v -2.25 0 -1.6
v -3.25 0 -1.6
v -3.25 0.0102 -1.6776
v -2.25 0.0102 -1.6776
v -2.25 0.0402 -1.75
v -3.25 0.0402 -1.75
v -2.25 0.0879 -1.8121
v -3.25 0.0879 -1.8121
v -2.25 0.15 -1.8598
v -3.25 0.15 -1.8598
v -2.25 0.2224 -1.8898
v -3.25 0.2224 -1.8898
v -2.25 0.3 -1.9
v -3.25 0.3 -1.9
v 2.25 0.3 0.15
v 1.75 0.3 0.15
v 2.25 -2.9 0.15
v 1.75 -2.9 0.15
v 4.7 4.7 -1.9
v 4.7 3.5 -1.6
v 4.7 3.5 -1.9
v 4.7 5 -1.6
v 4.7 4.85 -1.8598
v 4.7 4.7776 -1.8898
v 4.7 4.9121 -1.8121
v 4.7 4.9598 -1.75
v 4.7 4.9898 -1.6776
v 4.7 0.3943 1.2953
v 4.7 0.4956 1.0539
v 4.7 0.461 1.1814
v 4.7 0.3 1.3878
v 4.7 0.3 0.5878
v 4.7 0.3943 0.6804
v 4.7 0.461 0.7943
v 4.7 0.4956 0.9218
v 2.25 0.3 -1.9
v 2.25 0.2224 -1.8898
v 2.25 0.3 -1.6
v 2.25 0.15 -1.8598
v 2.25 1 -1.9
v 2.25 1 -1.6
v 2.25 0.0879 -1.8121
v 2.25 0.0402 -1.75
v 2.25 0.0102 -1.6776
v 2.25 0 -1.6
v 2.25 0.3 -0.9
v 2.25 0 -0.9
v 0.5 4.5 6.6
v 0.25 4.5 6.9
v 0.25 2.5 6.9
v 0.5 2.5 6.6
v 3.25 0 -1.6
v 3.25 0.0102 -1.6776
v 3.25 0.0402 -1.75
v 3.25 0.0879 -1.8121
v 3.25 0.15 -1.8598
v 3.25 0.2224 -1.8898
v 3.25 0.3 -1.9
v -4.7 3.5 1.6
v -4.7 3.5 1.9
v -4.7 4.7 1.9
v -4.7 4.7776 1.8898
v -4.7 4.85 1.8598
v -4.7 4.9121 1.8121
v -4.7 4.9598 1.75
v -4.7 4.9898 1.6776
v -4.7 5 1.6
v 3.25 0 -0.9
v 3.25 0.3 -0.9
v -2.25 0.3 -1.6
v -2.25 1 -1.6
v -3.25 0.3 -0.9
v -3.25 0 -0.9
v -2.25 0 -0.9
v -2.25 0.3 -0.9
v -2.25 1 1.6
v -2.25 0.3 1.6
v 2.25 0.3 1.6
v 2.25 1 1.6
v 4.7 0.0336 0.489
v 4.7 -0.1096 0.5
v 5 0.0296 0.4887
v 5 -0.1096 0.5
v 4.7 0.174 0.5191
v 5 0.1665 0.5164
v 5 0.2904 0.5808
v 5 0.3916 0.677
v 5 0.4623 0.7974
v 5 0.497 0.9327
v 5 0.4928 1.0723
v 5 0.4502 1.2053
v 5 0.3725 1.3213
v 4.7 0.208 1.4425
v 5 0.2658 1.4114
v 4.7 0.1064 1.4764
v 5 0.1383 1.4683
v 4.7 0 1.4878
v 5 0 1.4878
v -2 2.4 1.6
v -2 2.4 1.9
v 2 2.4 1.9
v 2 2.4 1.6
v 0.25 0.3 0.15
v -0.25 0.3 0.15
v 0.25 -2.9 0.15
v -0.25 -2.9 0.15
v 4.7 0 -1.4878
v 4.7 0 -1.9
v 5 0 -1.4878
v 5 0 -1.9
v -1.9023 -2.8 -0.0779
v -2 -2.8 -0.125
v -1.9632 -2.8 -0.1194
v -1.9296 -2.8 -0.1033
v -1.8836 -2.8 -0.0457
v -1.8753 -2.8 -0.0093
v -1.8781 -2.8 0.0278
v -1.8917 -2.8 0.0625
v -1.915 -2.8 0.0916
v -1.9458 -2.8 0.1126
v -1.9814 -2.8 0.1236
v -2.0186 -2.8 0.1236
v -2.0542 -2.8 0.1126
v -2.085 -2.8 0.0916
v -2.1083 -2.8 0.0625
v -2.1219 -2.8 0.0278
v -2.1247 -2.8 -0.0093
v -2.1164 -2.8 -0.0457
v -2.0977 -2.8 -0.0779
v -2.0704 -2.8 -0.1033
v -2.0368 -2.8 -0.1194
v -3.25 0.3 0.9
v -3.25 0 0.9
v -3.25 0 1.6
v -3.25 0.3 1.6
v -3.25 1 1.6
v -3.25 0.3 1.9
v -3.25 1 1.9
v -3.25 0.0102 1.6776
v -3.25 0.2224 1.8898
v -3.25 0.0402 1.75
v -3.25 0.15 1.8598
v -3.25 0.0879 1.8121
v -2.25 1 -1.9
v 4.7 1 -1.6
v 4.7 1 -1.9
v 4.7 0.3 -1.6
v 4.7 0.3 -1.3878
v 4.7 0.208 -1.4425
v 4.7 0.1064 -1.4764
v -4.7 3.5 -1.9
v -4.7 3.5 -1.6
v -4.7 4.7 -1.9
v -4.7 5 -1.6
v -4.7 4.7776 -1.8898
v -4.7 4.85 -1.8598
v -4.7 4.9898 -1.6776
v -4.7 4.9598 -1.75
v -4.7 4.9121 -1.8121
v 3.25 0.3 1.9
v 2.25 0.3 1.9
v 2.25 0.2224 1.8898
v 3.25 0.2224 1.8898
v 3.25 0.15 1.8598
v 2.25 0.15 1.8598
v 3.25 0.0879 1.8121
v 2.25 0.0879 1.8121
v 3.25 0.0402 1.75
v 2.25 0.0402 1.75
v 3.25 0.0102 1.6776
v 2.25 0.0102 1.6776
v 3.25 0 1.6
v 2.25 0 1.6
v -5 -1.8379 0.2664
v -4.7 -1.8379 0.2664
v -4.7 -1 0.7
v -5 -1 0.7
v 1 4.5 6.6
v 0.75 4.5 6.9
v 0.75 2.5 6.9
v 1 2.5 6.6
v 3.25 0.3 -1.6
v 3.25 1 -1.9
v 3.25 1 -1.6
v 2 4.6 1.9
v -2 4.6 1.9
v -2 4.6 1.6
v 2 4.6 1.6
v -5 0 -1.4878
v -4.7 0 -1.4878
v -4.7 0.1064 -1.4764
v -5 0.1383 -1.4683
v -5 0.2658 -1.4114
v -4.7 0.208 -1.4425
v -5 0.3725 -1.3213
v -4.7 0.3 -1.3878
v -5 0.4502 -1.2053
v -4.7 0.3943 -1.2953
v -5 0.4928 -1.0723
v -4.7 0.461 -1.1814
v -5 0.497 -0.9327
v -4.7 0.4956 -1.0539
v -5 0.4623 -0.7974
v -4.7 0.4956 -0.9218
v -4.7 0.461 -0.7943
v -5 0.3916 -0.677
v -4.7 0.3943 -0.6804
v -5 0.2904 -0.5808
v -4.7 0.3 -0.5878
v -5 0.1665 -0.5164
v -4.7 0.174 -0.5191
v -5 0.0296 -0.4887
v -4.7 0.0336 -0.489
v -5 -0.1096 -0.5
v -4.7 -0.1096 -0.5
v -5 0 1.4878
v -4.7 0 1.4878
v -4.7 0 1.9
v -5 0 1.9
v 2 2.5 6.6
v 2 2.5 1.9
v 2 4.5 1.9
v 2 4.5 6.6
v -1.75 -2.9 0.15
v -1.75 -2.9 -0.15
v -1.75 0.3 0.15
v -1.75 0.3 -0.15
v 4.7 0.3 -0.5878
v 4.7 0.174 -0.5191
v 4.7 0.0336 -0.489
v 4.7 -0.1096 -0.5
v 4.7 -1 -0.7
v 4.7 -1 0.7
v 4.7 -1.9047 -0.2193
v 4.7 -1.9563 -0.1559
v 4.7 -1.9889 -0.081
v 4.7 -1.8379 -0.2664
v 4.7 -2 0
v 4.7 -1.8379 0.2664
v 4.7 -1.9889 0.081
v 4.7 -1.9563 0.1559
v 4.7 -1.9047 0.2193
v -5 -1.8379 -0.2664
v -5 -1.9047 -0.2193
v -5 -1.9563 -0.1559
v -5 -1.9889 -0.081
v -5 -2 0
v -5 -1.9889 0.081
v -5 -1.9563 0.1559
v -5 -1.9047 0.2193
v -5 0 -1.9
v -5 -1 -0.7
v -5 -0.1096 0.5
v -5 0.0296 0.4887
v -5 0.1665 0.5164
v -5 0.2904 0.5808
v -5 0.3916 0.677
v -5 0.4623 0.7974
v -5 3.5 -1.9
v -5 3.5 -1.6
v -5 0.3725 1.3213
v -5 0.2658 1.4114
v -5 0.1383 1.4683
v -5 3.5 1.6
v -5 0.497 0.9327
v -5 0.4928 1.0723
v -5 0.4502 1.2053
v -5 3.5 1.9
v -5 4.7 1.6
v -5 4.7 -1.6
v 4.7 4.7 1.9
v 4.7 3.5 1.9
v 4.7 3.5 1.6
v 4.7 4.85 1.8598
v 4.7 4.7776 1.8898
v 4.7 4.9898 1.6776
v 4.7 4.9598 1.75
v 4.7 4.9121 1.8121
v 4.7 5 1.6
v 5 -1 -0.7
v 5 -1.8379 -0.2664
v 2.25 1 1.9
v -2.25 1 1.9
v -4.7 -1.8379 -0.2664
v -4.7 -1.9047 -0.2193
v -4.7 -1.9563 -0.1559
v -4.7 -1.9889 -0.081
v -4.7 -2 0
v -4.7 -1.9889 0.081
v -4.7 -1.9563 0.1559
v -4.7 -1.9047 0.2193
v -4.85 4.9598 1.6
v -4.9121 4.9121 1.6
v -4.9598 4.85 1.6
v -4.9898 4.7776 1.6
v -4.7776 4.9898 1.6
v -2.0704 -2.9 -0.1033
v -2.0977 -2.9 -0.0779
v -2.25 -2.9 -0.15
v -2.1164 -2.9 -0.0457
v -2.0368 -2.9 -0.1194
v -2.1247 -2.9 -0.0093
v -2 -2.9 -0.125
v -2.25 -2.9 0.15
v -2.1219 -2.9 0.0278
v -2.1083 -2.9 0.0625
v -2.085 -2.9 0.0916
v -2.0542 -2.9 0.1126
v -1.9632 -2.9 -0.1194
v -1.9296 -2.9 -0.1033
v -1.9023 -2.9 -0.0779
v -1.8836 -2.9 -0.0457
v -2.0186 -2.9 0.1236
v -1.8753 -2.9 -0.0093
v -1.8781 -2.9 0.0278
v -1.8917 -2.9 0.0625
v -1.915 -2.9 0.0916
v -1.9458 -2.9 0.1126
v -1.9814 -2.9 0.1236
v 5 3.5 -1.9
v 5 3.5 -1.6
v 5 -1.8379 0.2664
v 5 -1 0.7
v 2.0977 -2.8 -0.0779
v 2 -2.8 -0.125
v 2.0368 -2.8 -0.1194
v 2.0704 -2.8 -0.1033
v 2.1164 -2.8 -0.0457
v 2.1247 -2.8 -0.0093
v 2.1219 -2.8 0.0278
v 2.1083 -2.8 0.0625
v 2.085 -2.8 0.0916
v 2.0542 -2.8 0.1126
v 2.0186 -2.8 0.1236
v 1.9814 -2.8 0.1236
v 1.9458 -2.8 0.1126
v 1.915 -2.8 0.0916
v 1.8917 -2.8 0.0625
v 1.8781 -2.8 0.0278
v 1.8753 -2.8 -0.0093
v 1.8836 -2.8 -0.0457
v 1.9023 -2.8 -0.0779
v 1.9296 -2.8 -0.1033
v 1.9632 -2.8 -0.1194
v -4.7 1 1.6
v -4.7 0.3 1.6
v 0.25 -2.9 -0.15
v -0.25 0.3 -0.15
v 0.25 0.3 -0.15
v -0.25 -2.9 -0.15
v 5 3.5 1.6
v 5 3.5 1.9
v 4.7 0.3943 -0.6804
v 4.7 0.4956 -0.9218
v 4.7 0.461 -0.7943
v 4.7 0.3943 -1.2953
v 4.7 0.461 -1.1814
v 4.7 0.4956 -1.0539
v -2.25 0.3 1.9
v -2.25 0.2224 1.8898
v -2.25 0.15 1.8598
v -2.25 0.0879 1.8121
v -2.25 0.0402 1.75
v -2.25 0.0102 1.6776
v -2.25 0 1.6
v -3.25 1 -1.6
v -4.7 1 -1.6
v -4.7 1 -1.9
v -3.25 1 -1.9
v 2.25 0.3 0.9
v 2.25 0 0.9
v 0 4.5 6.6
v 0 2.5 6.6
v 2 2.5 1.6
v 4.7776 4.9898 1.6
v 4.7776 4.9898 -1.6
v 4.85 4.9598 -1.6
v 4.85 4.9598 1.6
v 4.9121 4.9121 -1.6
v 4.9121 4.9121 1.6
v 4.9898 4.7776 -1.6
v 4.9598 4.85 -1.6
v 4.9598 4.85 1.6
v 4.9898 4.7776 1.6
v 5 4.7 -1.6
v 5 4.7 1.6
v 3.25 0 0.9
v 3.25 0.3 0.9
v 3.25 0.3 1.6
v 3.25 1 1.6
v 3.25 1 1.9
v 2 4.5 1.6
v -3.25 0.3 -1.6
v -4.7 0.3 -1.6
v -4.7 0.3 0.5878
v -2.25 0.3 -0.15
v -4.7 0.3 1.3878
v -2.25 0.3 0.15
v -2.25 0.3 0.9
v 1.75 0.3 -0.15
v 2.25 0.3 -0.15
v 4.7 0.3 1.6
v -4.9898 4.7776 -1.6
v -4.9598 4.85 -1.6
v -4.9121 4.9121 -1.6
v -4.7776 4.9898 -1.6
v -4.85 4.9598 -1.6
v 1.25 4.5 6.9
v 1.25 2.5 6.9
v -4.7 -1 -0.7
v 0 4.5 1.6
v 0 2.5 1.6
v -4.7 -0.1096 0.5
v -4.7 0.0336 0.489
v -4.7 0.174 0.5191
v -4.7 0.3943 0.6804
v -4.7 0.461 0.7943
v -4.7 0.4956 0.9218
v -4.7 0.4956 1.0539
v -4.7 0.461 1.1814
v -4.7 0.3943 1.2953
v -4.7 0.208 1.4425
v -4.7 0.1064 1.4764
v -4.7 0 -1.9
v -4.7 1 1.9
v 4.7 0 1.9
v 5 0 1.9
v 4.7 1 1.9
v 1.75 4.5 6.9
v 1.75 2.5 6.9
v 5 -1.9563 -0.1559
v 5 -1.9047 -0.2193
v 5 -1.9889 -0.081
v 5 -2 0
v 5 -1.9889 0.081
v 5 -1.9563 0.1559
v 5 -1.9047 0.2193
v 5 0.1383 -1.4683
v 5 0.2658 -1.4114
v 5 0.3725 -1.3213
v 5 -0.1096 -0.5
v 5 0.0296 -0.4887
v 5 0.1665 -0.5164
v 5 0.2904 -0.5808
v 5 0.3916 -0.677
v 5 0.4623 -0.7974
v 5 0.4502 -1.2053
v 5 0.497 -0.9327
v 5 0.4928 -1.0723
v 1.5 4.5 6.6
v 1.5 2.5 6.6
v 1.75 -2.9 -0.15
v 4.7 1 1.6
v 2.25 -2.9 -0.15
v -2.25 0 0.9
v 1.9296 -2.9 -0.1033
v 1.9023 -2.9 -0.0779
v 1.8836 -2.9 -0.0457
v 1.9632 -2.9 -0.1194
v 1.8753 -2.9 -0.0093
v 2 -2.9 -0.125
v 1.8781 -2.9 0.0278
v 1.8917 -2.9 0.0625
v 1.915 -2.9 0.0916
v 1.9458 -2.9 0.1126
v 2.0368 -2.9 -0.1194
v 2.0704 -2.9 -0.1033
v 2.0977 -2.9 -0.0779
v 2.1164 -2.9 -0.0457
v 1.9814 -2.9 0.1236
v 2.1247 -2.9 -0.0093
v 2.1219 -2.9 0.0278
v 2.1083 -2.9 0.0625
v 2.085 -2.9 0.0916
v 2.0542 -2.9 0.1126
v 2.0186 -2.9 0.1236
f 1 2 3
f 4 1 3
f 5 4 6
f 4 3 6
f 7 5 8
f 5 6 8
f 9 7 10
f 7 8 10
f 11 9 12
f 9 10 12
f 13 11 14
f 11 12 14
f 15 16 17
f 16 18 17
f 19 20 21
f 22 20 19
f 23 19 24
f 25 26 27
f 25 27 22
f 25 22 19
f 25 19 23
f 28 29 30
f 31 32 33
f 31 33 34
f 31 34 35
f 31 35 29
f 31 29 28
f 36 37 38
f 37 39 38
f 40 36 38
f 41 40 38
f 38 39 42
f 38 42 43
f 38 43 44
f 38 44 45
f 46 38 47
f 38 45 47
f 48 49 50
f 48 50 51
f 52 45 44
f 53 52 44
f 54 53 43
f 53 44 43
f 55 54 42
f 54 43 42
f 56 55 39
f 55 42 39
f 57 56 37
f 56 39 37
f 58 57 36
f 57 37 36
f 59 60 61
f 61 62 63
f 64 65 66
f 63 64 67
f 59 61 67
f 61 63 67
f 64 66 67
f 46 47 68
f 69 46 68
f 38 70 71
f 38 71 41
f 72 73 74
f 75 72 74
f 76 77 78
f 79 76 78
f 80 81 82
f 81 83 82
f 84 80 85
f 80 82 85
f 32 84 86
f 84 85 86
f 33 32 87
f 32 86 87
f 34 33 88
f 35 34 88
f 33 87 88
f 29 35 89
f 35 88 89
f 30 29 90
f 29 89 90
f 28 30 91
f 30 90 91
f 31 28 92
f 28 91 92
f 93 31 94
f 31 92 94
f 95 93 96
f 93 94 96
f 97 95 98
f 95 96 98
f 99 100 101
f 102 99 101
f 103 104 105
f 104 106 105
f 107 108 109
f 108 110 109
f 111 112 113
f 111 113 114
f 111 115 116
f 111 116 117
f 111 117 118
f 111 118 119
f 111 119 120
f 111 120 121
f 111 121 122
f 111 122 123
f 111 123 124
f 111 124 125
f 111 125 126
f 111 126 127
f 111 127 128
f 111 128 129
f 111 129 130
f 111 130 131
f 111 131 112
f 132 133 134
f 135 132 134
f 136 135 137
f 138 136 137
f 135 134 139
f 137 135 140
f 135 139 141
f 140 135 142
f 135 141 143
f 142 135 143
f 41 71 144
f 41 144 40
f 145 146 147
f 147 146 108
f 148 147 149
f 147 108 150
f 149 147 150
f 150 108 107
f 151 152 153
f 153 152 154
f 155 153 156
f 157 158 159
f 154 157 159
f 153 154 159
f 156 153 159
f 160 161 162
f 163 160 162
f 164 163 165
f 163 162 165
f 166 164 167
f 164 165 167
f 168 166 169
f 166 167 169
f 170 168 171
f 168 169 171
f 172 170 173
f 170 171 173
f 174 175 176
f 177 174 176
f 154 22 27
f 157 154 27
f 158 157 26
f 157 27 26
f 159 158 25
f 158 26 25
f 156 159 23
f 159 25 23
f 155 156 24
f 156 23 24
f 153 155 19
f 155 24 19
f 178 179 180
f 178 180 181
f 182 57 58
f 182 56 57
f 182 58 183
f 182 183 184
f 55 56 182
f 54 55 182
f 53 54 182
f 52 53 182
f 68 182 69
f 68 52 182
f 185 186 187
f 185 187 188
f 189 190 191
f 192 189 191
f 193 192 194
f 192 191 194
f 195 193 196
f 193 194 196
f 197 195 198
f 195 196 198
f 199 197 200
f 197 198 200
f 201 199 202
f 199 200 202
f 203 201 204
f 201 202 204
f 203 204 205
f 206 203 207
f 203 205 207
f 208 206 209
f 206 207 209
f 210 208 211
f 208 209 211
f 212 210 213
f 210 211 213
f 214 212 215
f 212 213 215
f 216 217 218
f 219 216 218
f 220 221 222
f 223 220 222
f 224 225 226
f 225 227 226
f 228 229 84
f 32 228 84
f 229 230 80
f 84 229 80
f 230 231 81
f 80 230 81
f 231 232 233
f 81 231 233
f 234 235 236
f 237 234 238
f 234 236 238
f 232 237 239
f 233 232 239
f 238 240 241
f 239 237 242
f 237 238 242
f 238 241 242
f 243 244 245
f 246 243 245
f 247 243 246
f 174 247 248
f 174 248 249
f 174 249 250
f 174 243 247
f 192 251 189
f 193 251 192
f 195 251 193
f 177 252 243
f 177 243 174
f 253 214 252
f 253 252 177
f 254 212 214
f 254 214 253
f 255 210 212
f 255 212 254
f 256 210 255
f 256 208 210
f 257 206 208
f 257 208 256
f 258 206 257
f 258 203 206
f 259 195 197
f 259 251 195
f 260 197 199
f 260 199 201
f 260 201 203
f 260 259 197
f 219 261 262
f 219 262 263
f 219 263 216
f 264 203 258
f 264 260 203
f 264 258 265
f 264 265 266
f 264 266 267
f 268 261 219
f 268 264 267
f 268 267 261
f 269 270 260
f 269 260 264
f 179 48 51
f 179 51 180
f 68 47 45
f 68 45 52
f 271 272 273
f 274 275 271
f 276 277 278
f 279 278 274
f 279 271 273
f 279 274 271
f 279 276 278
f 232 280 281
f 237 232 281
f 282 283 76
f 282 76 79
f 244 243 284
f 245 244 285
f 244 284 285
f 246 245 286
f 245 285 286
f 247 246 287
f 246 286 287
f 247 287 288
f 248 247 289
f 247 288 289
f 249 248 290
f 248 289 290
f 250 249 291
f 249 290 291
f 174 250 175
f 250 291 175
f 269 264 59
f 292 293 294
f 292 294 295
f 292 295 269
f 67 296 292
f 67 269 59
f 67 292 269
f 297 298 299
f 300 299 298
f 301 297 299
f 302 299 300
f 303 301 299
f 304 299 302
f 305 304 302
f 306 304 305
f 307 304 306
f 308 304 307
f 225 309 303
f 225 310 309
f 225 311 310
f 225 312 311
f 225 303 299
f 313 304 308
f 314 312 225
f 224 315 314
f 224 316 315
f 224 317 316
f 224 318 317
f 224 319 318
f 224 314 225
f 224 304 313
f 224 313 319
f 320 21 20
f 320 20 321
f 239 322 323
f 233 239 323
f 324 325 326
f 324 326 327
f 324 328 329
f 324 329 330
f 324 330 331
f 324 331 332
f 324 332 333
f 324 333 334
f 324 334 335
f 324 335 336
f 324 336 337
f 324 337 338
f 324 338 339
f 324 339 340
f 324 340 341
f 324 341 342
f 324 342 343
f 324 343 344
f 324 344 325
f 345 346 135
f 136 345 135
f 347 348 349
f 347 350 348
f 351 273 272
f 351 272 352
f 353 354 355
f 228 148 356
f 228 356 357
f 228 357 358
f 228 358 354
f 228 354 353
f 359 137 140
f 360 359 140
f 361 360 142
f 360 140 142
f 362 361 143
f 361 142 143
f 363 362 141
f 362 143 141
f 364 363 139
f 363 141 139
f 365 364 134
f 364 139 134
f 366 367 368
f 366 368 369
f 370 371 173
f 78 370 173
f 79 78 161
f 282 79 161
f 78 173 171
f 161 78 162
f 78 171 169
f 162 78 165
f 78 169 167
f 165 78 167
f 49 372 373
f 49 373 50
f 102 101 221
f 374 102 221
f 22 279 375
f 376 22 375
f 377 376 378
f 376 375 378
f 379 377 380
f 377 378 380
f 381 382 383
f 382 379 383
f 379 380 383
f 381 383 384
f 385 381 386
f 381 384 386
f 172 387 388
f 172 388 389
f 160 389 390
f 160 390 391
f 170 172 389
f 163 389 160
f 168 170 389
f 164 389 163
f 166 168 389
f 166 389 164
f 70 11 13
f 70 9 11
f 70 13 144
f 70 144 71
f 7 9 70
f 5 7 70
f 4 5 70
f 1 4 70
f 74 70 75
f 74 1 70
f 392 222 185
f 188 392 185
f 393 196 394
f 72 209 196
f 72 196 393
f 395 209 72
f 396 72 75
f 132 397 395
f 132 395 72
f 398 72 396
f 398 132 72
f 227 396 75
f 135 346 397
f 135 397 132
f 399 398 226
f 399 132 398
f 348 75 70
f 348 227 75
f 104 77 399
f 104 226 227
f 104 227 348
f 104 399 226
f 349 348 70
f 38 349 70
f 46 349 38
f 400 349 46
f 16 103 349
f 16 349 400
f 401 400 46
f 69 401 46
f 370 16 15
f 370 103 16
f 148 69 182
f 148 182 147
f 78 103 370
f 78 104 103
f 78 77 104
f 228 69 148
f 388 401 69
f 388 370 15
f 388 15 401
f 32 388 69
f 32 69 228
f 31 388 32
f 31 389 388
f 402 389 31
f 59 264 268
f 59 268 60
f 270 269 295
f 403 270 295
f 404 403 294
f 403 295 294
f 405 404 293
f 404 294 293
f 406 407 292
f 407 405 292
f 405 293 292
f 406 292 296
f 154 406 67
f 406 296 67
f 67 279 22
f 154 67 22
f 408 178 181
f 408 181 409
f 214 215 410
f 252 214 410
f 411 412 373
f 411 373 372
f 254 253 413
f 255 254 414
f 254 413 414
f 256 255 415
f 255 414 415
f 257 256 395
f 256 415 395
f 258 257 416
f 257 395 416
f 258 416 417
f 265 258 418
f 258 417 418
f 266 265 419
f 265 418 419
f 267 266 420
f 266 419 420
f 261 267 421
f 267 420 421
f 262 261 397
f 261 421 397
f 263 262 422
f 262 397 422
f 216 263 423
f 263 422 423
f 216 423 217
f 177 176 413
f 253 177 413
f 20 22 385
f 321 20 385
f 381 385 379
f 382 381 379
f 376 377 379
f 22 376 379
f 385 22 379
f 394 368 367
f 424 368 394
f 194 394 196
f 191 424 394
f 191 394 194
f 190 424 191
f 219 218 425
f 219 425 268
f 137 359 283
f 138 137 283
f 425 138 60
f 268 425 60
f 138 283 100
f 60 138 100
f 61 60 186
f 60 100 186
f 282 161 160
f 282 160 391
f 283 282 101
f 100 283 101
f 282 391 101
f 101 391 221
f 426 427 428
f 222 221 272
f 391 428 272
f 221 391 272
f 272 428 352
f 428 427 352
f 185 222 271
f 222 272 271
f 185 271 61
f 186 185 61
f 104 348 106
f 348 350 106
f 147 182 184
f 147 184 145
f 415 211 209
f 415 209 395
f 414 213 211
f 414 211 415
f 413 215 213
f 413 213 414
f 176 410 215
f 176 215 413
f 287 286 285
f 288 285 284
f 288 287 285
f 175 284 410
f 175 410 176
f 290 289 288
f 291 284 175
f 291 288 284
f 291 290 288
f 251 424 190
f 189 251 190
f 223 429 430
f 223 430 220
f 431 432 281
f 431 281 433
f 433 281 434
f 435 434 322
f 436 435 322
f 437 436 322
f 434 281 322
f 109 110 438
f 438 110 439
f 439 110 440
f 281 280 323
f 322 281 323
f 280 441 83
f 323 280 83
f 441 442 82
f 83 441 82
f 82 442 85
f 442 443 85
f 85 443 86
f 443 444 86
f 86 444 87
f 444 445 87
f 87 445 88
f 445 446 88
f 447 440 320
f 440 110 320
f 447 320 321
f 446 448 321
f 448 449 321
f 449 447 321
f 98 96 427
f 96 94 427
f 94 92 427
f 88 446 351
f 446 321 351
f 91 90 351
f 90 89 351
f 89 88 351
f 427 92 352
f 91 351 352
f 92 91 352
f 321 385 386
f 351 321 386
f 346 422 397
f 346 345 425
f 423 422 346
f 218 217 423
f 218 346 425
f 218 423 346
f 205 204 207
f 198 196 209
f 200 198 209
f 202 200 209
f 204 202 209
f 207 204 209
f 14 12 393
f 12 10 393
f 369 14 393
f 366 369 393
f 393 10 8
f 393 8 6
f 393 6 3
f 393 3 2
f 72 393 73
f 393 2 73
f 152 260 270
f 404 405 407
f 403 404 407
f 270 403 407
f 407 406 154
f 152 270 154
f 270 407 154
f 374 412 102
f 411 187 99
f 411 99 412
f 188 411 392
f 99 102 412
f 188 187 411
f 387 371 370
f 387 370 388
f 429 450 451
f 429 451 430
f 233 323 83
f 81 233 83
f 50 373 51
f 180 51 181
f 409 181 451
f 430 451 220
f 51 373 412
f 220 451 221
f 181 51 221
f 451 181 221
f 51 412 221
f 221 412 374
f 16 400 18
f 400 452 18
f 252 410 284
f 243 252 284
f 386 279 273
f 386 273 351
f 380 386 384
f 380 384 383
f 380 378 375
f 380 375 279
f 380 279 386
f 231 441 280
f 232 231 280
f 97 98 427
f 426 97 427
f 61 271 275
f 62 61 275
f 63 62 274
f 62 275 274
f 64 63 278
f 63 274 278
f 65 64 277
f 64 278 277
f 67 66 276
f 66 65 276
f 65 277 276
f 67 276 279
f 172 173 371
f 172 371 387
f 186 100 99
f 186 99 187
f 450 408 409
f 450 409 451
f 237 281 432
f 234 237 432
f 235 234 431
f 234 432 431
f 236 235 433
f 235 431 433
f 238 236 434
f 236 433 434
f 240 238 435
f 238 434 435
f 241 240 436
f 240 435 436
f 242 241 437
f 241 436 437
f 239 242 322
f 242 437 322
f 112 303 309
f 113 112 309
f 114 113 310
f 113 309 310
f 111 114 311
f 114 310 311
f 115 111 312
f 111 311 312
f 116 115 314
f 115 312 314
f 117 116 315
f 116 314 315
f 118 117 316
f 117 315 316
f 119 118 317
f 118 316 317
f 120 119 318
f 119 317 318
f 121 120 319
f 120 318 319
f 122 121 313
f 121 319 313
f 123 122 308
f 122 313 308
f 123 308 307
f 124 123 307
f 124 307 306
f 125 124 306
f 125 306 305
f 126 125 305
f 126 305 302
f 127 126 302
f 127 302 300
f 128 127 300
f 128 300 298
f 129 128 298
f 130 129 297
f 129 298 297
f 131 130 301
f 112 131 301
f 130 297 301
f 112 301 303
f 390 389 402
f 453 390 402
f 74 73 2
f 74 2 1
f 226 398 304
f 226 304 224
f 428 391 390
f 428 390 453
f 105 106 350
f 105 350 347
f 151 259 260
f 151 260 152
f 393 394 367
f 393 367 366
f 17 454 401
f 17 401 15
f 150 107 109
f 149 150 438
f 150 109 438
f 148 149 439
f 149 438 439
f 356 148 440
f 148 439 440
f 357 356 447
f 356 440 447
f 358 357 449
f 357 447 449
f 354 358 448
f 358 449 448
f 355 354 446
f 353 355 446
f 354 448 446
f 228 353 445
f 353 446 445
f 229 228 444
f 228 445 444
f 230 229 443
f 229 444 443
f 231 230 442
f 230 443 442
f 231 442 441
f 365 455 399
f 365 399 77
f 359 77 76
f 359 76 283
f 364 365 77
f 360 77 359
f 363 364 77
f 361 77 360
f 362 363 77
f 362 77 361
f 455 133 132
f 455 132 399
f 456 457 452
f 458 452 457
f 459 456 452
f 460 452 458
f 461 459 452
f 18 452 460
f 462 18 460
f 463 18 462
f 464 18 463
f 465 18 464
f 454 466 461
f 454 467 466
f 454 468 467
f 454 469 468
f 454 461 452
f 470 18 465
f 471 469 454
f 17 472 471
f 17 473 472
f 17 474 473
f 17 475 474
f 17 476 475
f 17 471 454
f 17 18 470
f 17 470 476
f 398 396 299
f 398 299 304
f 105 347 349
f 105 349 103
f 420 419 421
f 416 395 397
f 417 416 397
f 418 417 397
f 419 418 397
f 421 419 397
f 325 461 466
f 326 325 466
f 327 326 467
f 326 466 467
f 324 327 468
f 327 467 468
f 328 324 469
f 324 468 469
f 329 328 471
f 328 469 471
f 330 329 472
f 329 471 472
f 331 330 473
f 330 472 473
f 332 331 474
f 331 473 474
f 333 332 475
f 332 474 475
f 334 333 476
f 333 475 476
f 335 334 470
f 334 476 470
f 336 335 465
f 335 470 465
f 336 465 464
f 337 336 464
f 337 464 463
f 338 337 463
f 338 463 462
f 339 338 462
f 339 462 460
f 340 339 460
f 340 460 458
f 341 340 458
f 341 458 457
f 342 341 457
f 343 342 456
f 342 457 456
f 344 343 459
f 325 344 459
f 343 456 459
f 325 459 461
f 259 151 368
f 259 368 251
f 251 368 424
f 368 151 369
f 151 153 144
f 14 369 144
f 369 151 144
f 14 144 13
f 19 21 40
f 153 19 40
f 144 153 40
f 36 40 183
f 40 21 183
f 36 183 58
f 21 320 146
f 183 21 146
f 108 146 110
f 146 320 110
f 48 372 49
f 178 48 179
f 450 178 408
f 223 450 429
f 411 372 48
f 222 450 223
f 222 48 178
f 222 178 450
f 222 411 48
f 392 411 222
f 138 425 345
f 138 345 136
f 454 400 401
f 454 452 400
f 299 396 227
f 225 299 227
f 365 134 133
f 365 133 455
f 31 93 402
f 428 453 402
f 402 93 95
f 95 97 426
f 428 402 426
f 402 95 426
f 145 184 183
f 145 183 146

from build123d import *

# Parameters (mm, degrees)
BOSS_EXTRUDE1_DEPTH = 5
SKETCH3_OUTSIDE_W   = 14.556
SKETCH3_OUTSIDE_H   = 8.356
SKETCH3_OUTSIDE_W_2 = 0.5
SKETCH3_OUTSIDE_H_2 = 0.3
SKETCH3_OUTSIDE_W_3 = 0.3
SKETCH3_OUTSIDE_H_3 = 3.8
CUT_EXTRUDE1_DEPTH  = 8.321885003
SKETCH4_W           = 0.5
SKETCH4_H           = 0.3
BOSS_EXTRUDE2_DEPTH = 2.9
SKETCH5_W           = 1.45
SKETCH5_H           = 0.3
SKETCH5_W_2         = 4.5
CUT_EXTRUDE2_DEPTH  = 1
SKETCH6_W           = 9.4
SKETCH6_H           = 3.2
SKETCH6_W_2         = 0.5
SKETCH6_H_2         = 0.3
CUT_EXTRUDE3_DEPTH  = 0.3
SKETCH7_W           = 9.4
SKETCH7_H           = 3.2
BOSS_EXTRUDE3_DEPTH = 0.7
SKETCH8_W           = 1
SKETCH8_H           = 1
BOSS_EXTRUDE4_DEPTH = 0.3
FILLET2_R           = 0.3
SKETCH9_W           = 4
SKETCH9_H           = 2.2
CUT_EXTRUDE4_DEPTH  = 0.3
SKETCH10_W          = 2
SKETCH10_H          = 2
BOSS_EXTRUDE5_DEPTH = 5.3
CUT_EXTRUDE5_DEPTH  = 12.285831826
SKETCH12_R          = 0.125
CUT_EXTRUDE6_DEPTH  = 0.1
SKETCH13_W          = 0.3
SKETCH13_H          = 0.3
CUT_EXTRUDE7_DEPTH  = 1.5


with BuildPart() as part:
    # Sketch2 → Boss-Extrude1 (new, symmetric)
    with BuildSketch(Plane(origin=(0, 0, 0), x_dir=(0, 0, -1), z_dir=(1, 0, 0))):
        with BuildLine():
            Line((-1.6, 5), (1.6, 5))
            ThreePointArc((1.6, 5), (1.812132034, 4.912132034), (1.9, 4.7))
            Line((1.9, 4.7), (1.9, 0))
            Line((1.9, 0), (1.487845372, 0))
            ThreePointArc((1.487845372, 0), (0.932721359, 0.496952053), (0.5, -0.109575967))
            Line((0.5, -0.109575967), (0.7, -1))
            Line((0.7, -1), (0.266442453, -1.837871024))
            ThreePointArc((0.266442453, -1.837871024), (0, -2), (-0.266442453, -1.837871024))
            Line((-0.266442453, -1.837871024), (-0.7, -1))
            Line((-0.7, -1), (-0.5, -0.109575967))
            ThreePointArc((-0.5, -0.109575967), (-0.932721359, 0.496952053), (-1.487845372, 0))
            Line((-1.487845372, 0), (-1.9, 0))
            Line((-1.9, 0), (-1.9, 4.7))
            ThreePointArc((-1.9, 4.7), (-1.812132034, 4.912132034), (-1.6, 5))
        make_face()
    extrude(amount=BOSS_EXTRUDE1_DEPTH, both=True)

    # Sketch3 outside → Cut-Extrude1 (cut, through all)
    with BuildSketch(Plane.XZ):
        Rectangle(SKETCH3_OUTSIDE_W, SKETCH3_OUTSIDE_H)
        with Locations((-2, 0)):
            Rectangle(SKETCH3_OUTSIDE_W_2, SKETCH3_OUTSIDE_H_2, mode=Mode.SUBTRACT)
        Rectangle(SKETCH3_OUTSIDE_W_2, SKETCH3_OUTSIDE_H_2, mode=Mode.SUBTRACT)
        with Locations((2, 0)):
            Rectangle(SKETCH3_OUTSIDE_W_2, SKETCH3_OUTSIDE_H_2, mode=Mode.SUBTRACT)
        with Locations((-4.85, 0)):
            Rectangle(SKETCH3_OUTSIDE_W_3, SKETCH3_OUTSIDE_H_3, mode=Mode.SUBTRACT)
        with Locations((4.85, 0)):
            Rectangle(SKETCH3_OUTSIDE_W_3, SKETCH3_OUTSIDE_H_3, mode=Mode.SUBTRACT)
    extrude(amount=CUT_EXTRUDE1_DEPTH, mode=Mode.SUBTRACT)

    # Sketch4 → Boss-Extrude2 (add)
    with BuildSketch(Plane.XZ):
        with Locations((-2, 0)):
            Rectangle(SKETCH4_W, SKETCH4_H)
        Rectangle(SKETCH4_W, SKETCH4_H)
        with Locations((2, 0)):
            Rectangle(SKETCH4_W, SKETCH4_H)
    extrude(amount=BOSS_EXTRUDE2_DEPTH)

    # Sketch5 → Cut-Extrude2 (cut)
    with BuildSketch(Plane.XZ):
        with Locations((-3.975, 1.75)):
            Rectangle(SKETCH5_W, SKETCH5_H)
        with Locations((0, 1.75)):
            Rectangle(SKETCH5_W_2, SKETCH5_H)
        with Locations((3.975, 1.75)):
            Rectangle(SKETCH5_W, SKETCH5_H)
        with Locations((3.975, -1.75)):
            Rectangle(SKETCH5_W, SKETCH5_H)
        with Locations((0, -1.75)):
            Rectangle(SKETCH5_W_2, SKETCH5_H)
        with Locations((-3.975, -1.75)):
            Rectangle(SKETCH5_W, SKETCH5_H)
    extrude(amount=-CUT_EXTRUDE2_DEPTH, mode=Mode.SUBTRACT)

    # Sketch6 → Cut-Extrude3 (cut)
    with BuildSketch(Plane.XZ):
        Rectangle(SKETCH6_W, SKETCH6_H)
        with Locations((-2, 0)):
            Rectangle(SKETCH6_W_2, SKETCH6_H_2, mode=Mode.SUBTRACT)
        Rectangle(SKETCH6_W_2, SKETCH6_H_2, mode=Mode.SUBTRACT)
        with Locations((2, 0)):
            Rectangle(SKETCH6_W_2, SKETCH6_H_2, mode=Mode.SUBTRACT)
    extrude(amount=-CUT_EXTRUDE3_DEPTH, mode=Mode.SUBTRACT)

    # Sketch7 → Boss-Extrude3 (add)
    with BuildSketch(Plane.XZ.offset(-0.3)):
        Rectangle(SKETCH7_W, SKETCH7_H)
    extrude(amount=-BOSS_EXTRUDE3_DEPTH)

    # Sketch8 → Boss-Extrude4 (add)
    with BuildSketch(Plane.XZ):
        with Locations((-2.75, 1.4)):
            Rectangle(SKETCH8_W, SKETCH8_H)
        with Locations((2.75, 1.4)):
            Rectangle(SKETCH8_W, SKETCH8_H)
        with Locations((2.75, -1.4)):
            Rectangle(SKETCH8_W, SKETCH8_H)
        with Locations((-2.75, -1.4)):
            Rectangle(SKETCH8_W, SKETCH8_H)
    extrude(amount=-BOSS_EXTRUDE4_DEPTH)

    # Fillet2
    # the kernel refuses this fillet: 0.3 mm, written as the material it takes off along each edge
    with BuildSketch(Plane(origin=(-5, 5, 2.35), x_dir=(1, 0, 0), z_dir=(0, 0, -1)), Plane(origin=(5, 5, 2.35), x_dir=(0, -1, 0), z_dir=(0, 0, -1))) as fillet2_piece_1:
        with BuildLine():
            CenterArc((FILLET2_R, FILLET2_R), FILLET2_R, 180, 90)
            Line((0, FILLET2_R), (0, 0))
            Line((0, 0), (FILLET2_R, 0))
        make_face()
    extrude(amount=4.7, mode=Mode.SUBTRACT)
    with BuildSketch(Plane(origin=(1.5, 0, 1.9), x_dir=(0, 0, -1), z_dir=(1, 0, 0)), Plane(origin=(-4, 0, 1.9), x_dir=(0, 0, -1), z_dir=(1, 0, 0))) as fillet2_piece_2:
        with BuildLine():
            CenterArc((FILLET2_R, FILLET2_R), FILLET2_R, 180, 90)
            Line((0, FILLET2_R), (0, 0))
            Line((0, 0), (FILLET2_R, 0))
        make_face()
    extrude(amount=2.5, mode=Mode.SUBTRACT)
    with BuildSketch(Plane(origin=(1.5, 0, -1.9), x_dir=(0, 0, 1), z_dir=(1, 0, 0)), Plane(origin=(-4, 0, -1.9), x_dir=(0, 0, 1), z_dir=(1, 0, 0))) as fillet2_piece_3:
        with BuildLine():
            CenterArc((FILLET2_R, -FILLET2_R), FILLET2_R, 90, 90)
            Line((0, -FILLET2_R), (0, 0))
            Line((0, 0), (FILLET2_R, 0))
        make_face()
    extrude(amount=2.5, mode=Mode.SUBTRACT)

    # Sketch9 → Cut-Extrude4 (cut)
    with BuildSketch(Plane.XY.offset(1.9)):
        with Locations((0, 3.5)):
            Rectangle(SKETCH9_W, SKETCH9_H)
    extrude(amount=-CUT_EXTRUDE4_DEPTH, mode=Mode.SUBTRACT)

    # Sketch10 → Boss-Extrude5 (add)
    with BuildSketch(Plane.XY.offset(1.6)):
        with Locations((1, 3.5)):
            Rectangle(SKETCH10_W, SKETCH10_H)
    extrude(amount=BOSS_EXTRUDE5_DEPTH)

    # Sketch11 → Cut-Extrude5 (cut, through all)
    with BuildSketch(Plane(origin=(0, 4.5, 0), x_dir=(1, 0, 0), z_dir=(0, 1, 0))):
        Polygon((0, -6.6), (0.25, -6.9), (0.5, -6.6), (0.75, -6.9), (1, -6.6), (1.25, -6.9), (1.5, -6.6), (1.75, -6.9), (2, -6.6), (2.5, -6.6), (2.5, -7.4), (-0.5, -7.4), (-0.5, -6.6), align=None)
    extrude(amount=-CUT_EXTRUDE5_DEPTH, mode=Mode.SUBTRACT)

    # Sketch12 → Cut-Extrude6 (cut)
    with BuildSketch(Plane.XZ.offset(2.9)):
        with Locations(Location((-2, 0, 0), (0, 0, 270))):
            Circle(SKETCH12_R)
        with Locations(Location((2, 0, 0), (0, 0, 270))):
            Circle(SKETCH12_R)
    extrude(amount=-CUT_EXTRUDE6_DEPTH, mode=Mode.SUBTRACT)

    # Sketch13 → Cut-Extrude7 (cut)
    with BuildSketch(Plane(origin=(0, 5, 0), x_dir=(1, 0, 0), z_dir=(0, 1, 0))):
        with Locations((-4.85, -1.75)):
            Rectangle(SKETCH13_W, SKETCH13_H)
        with Locations((-4.85, 1.75)):
            Rectangle(SKETCH13_W, SKETCH13_H)
        with Locations((4.85, 1.75)):
            Rectangle(SKETCH13_W, SKETCH13_H)
        with Locations((4.85, -1.75)):
            Rectangle(SKETCH13_W, SKETCH13_H)
    extrude(amount=-CUT_EXTRUDE7_DEPTH, mode=Mode.SUBTRACT)


solid = part.part
